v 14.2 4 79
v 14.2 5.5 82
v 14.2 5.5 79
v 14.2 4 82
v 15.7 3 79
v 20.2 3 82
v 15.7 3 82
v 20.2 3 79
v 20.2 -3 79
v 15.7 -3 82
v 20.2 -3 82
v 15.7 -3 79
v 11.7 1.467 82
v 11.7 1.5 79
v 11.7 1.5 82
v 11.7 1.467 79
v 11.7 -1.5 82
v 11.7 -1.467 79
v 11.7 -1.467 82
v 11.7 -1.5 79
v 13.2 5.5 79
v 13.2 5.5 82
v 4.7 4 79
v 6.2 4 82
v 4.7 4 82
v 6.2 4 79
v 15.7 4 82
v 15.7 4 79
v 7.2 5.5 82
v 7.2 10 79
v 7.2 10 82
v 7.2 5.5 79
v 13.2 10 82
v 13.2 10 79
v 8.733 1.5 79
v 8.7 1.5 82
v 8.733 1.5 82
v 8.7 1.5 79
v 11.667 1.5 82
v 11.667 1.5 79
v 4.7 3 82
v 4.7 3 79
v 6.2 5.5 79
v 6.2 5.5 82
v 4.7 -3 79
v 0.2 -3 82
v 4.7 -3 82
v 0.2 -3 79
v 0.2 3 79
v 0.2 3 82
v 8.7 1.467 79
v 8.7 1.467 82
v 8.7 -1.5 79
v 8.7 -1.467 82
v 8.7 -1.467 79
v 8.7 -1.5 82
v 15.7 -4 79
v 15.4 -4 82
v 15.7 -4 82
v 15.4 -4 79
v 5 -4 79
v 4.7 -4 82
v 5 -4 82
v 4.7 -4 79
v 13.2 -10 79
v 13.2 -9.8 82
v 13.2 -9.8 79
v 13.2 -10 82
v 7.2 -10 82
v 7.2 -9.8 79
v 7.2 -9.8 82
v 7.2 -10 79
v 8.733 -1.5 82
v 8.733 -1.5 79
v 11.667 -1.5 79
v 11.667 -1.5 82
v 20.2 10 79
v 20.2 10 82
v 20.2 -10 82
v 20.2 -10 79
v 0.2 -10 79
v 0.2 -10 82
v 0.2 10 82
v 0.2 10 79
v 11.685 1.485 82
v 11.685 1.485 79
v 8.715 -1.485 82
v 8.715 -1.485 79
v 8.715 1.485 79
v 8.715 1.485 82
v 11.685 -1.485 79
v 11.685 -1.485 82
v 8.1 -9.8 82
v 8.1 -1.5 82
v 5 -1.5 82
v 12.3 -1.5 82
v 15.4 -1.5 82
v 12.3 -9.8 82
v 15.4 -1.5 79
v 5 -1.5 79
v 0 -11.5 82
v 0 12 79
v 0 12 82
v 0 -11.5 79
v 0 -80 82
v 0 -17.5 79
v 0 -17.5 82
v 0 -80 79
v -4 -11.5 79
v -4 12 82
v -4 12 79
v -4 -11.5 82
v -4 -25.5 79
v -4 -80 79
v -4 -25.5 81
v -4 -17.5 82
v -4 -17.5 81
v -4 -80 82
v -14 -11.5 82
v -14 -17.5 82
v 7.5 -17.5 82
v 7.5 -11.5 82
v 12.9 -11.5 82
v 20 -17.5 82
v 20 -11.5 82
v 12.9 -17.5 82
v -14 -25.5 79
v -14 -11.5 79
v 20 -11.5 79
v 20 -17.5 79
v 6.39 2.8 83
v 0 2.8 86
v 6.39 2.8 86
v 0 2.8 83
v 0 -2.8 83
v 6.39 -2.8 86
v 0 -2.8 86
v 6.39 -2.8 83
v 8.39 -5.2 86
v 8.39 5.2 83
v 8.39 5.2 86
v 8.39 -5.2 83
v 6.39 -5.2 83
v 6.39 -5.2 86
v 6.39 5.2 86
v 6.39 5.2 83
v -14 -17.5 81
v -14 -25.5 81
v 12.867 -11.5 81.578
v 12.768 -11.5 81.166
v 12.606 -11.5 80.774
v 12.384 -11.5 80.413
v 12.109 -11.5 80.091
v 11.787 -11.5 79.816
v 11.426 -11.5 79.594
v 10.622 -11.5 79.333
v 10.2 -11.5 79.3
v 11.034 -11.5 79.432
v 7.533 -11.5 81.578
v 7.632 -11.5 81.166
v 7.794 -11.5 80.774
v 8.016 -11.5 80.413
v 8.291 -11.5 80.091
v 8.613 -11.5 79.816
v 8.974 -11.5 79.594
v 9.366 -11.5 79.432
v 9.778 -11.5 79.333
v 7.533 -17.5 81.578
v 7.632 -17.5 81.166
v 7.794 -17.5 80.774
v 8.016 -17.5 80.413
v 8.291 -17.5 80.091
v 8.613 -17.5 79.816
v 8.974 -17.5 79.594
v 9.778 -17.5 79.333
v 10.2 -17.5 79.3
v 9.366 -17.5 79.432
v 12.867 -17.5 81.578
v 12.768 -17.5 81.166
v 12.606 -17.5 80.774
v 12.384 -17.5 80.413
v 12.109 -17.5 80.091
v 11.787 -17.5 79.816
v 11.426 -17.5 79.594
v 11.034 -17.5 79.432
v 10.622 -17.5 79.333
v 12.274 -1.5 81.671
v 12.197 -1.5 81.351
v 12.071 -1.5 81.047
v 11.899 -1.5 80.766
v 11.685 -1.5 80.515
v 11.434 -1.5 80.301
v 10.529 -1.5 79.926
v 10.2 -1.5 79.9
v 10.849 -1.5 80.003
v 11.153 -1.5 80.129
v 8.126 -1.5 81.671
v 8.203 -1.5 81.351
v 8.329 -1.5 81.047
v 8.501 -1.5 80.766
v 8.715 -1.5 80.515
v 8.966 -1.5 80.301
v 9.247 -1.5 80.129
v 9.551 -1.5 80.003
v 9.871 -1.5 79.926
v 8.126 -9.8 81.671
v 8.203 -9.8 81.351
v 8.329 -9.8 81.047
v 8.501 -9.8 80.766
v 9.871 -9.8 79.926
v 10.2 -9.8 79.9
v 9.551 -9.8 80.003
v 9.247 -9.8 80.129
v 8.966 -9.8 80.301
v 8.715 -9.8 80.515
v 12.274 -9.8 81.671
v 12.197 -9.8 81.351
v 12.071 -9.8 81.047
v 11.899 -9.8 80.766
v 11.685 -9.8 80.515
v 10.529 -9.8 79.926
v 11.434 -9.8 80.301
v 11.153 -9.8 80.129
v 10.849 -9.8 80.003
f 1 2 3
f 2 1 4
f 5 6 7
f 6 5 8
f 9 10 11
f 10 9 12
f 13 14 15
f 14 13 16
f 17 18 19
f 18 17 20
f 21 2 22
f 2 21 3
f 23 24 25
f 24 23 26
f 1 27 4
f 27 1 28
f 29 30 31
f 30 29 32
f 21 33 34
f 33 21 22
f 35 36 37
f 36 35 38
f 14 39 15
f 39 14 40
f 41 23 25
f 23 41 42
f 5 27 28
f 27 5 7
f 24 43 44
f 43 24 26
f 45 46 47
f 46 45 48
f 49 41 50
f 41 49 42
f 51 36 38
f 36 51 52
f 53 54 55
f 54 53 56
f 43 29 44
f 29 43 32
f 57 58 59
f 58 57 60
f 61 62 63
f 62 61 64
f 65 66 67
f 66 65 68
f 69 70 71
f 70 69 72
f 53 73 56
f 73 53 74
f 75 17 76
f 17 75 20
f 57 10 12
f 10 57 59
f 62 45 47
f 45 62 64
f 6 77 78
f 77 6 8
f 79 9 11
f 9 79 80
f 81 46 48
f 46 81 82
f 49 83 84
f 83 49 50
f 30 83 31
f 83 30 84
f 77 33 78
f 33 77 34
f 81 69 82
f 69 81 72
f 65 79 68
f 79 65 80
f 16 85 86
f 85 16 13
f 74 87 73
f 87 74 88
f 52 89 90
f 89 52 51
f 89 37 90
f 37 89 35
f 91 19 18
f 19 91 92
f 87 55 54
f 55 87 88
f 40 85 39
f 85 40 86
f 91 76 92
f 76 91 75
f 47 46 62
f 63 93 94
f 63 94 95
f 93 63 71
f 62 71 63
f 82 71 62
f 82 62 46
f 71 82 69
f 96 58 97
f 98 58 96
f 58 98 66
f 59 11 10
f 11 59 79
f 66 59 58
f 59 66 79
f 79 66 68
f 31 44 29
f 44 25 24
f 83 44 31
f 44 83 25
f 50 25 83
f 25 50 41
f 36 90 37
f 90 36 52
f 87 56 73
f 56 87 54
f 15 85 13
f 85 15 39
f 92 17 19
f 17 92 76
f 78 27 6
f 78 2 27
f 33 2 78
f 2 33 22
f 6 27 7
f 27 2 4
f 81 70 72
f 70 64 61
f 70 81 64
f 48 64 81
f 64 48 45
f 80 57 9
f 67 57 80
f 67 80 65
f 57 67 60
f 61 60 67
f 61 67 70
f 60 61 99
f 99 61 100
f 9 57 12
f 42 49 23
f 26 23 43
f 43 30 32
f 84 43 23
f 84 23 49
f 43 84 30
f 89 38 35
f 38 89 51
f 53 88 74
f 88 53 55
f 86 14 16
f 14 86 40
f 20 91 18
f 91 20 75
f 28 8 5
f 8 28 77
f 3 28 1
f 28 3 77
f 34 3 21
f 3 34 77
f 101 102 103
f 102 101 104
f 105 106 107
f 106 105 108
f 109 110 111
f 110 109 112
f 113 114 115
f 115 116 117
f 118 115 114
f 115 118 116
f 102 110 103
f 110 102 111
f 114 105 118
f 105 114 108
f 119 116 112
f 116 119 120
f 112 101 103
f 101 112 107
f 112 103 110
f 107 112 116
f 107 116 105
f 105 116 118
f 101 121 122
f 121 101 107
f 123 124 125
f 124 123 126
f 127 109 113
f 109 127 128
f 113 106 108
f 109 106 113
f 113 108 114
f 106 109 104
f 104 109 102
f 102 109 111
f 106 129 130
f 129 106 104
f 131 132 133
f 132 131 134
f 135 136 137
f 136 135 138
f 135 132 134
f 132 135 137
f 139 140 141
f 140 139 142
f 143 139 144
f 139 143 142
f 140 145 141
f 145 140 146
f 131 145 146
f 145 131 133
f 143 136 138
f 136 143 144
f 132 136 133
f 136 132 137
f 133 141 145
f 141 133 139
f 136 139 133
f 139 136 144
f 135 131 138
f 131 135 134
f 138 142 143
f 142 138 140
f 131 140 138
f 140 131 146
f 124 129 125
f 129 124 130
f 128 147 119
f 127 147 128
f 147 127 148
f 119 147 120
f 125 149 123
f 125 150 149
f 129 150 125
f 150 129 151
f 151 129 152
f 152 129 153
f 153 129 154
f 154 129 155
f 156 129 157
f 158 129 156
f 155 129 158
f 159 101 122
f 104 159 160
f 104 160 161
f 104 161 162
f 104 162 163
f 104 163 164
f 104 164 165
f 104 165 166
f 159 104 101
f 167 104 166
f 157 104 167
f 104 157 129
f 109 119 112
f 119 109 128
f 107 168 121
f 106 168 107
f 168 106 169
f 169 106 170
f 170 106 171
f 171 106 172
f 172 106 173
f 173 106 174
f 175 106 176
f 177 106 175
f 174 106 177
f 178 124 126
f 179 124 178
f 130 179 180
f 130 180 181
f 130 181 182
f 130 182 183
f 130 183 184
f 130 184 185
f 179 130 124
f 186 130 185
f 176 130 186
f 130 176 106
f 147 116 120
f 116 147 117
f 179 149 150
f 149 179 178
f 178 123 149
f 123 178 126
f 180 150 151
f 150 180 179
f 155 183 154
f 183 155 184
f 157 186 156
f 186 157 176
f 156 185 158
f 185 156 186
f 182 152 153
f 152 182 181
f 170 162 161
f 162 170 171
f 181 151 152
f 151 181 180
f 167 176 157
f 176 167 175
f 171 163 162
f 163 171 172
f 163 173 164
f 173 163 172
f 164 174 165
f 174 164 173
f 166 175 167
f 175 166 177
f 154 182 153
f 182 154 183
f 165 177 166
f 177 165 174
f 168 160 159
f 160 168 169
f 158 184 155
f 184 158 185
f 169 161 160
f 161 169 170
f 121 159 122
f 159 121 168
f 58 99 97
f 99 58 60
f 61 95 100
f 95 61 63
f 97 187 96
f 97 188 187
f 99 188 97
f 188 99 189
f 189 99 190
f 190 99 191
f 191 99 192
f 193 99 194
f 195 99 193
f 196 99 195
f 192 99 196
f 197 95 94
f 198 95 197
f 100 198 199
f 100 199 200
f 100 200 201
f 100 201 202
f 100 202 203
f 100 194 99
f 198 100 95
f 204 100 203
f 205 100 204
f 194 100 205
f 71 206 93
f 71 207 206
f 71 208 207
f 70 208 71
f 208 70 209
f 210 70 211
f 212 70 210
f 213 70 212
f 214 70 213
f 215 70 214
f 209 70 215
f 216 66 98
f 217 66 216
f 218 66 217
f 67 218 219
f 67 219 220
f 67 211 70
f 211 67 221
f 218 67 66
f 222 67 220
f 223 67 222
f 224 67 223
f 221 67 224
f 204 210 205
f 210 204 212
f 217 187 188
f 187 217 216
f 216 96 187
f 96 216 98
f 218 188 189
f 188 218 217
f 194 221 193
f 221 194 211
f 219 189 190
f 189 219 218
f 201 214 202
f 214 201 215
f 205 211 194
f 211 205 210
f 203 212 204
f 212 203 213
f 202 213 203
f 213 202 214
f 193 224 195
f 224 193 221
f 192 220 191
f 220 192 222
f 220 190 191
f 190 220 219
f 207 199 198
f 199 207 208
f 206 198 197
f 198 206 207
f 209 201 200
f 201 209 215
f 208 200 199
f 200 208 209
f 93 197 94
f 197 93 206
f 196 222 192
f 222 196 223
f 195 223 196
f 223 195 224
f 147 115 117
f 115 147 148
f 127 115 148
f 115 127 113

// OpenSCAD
// ============================================================================
// CONCEPT D — T-SLOT CARTRIDGE DETAIL (massing-level, 80/20 20-series)
// The load-bearing element of the extrusion-frame concept: a printed ASA T-key
// on each side wall of the cartridge rides the facing slot of a 20-2020 mullion
// (Z-direction track; the cartridge drops in from the top).  Shown: one mullion,
// the cartridge side wall + faceplate return, its key in the slot, the captive
// M5 thumbscrew through the faceplate return into a slide-in T-nut in the
// mullion's front slot, the pull tab, the locking pigtail.
// Concept numbers only; the 20-series slot cavity (11.0) is to be read from the
// 80/20 CAD model (20-2020) before any key is cut.
// view = "plan" (horizontal section through the thumbscrew axis, from above)
//      | "iso"
// ============================================================================
view = "plan";
$fn = 40;
BLK = [0.19,0.19,0.21]; BLK2 = [0.29,0.29,0.32]; YEL = [1,0.8,0]; ANO = [0.15,0.15,0.17]; MET = [0.55,0.56,0.6];
E = 20; SLT = 6.0; SLD = 6.0; CAV = 11.0; CLR = 0.4;      // 20-2020 (cavity: verify in vendor CAD)
KEY_L = 88; NECK = SLT - CLR; HEAD = CAV - 0.6; HEAD_T = 2.0; LEAD = 1.0;
WALL = 4; H = 96; MX = E/2 + CLR/2;                         // mullion centre x; its -X face at x = CLR/2

module slab() { translate([-60, -100, H - 17]) cube([200, 200, 3]); }   // cut plane = thumbscrew axis (z = H-14)
module C(col) { if (view == "plan") color(col) render() intersection() { children(); slab(); } else color(col) children(); }

module extrusion(len) {                                     // along +Z, centred; slot on every face
  C(ANO) difference() {
    translate([-E/2, -E/2, 0]) cube([E, E, len]);
    for (r = [0, 90, 180, 270]) rotate([0, 0, r]) {
      translate([E/2 - SLD, -SLT/2, -1]) cube([SLD + 1, SLT, len + 2]);
      translate([E/2 - SLD - 2.5, -CAV/2, -1]) cube([2.5, CAV, len + 2]);
    }
    translate([0, 0, -1]) cylinder(d = 4.2, h = len + 2);
  }
}
module tkey() {                                              // grows +X from the wall face at x = 0
  C(BLK2) {
    hull() { translate([0, -NECK/2, LEAD]) cube([SLD + 0.4, NECK, KEY_L - 2*LEAD]);
             translate([0, -NECK/2 + LEAD, 0]) cube([SLD + 0.4, NECK - 2*LEAD, KEY_L]); }
    hull() { translate([SLD + 0.39, -HEAD/2, LEAD]) cube([HEAD_T, HEAD, KEY_L - 2*LEAD]);
             translate([SLD + 0.39, -HEAD/2 + LEAD, 0]) cube([HEAD_T - 0.6, HEAD - 2*LEAD, KEY_L]); }
  }
}
module tnut() {                                              // slide-in economy T-nut in the mullion's -Y slot (14122 class)
  C(MET) translate([MX - (CAV - 0.6)/2, -E/2 + 0.2, H - 20]) difference() {
    cube([CAV - 0.6, SLD + 2.3, 12]);
    translate([(CAV - 0.6)/2, -1, 6]) rotate([-90, 0, 0]) cylinder(d = 4.2, h = 12);
  }
}
module thumb() {                                             // captive M5 thumbscrew, shank along +Y
  C(YEL) rotate([-90, 0, 0]) { cylinder(d = 11, h = 7, $fn = 12); cylinder(d = 5, h = 7 + 6 + 2 + SLD + 4, $fn = 24);
                                   translate([0, 0, 7]) cylinder(d = 10, h = 1.2); }            // washer face
}
module scene() {
  translate([MX, 0, 0]) extrusion(H + 20);                                          // mullion
  C(BLK) translate([-WALL, -80, 0]) cube([WALL, 92, H]);                            // cartridge side wall
  translate([0, 0, 4]) tkey();                                                      // key: neck in the slot, head in the cavity
  C(BLK) difference() { translate([-WALL - 10, -E/2 - 6 - 1.5, H - 26]) cube([E + WALL + 10, 6, 22]);   // faceplate return (lug)
                        translate([MX, -E/2 - 20, H - 14]) rotate([-90, 0, 0]) cylinder(d = 5.4, h = 30); }   // M5 clearance bore
  tnut();
  translate([MX, -E/2 - 6 - 1.5 - 7, H - 14]) thumb();
  C(YEL) translate([-WALL - 10, -E/2 - 6 - 1.5 - 8, H - 22]) cube([10, 8, 7]);   // pull tab
  C([0.3,0.3,0.32]) translate([-WALL - 16, -30, 30]) rotate([90, 0, 0]) cylinder(d = 5, h = 38);   // pigtail
  C(MET) translate([-WALL - 16, -68, 30]) rotate([90, 0, 0]) cylinder(d = 10, h = 12, $fn = 6);     // locking connector
  C(YEL) translate([-WALL - 16, -71, 30]) rotate([90, 0, 0]) cylinder(d = 11.5, h = 3);
}
scene();
